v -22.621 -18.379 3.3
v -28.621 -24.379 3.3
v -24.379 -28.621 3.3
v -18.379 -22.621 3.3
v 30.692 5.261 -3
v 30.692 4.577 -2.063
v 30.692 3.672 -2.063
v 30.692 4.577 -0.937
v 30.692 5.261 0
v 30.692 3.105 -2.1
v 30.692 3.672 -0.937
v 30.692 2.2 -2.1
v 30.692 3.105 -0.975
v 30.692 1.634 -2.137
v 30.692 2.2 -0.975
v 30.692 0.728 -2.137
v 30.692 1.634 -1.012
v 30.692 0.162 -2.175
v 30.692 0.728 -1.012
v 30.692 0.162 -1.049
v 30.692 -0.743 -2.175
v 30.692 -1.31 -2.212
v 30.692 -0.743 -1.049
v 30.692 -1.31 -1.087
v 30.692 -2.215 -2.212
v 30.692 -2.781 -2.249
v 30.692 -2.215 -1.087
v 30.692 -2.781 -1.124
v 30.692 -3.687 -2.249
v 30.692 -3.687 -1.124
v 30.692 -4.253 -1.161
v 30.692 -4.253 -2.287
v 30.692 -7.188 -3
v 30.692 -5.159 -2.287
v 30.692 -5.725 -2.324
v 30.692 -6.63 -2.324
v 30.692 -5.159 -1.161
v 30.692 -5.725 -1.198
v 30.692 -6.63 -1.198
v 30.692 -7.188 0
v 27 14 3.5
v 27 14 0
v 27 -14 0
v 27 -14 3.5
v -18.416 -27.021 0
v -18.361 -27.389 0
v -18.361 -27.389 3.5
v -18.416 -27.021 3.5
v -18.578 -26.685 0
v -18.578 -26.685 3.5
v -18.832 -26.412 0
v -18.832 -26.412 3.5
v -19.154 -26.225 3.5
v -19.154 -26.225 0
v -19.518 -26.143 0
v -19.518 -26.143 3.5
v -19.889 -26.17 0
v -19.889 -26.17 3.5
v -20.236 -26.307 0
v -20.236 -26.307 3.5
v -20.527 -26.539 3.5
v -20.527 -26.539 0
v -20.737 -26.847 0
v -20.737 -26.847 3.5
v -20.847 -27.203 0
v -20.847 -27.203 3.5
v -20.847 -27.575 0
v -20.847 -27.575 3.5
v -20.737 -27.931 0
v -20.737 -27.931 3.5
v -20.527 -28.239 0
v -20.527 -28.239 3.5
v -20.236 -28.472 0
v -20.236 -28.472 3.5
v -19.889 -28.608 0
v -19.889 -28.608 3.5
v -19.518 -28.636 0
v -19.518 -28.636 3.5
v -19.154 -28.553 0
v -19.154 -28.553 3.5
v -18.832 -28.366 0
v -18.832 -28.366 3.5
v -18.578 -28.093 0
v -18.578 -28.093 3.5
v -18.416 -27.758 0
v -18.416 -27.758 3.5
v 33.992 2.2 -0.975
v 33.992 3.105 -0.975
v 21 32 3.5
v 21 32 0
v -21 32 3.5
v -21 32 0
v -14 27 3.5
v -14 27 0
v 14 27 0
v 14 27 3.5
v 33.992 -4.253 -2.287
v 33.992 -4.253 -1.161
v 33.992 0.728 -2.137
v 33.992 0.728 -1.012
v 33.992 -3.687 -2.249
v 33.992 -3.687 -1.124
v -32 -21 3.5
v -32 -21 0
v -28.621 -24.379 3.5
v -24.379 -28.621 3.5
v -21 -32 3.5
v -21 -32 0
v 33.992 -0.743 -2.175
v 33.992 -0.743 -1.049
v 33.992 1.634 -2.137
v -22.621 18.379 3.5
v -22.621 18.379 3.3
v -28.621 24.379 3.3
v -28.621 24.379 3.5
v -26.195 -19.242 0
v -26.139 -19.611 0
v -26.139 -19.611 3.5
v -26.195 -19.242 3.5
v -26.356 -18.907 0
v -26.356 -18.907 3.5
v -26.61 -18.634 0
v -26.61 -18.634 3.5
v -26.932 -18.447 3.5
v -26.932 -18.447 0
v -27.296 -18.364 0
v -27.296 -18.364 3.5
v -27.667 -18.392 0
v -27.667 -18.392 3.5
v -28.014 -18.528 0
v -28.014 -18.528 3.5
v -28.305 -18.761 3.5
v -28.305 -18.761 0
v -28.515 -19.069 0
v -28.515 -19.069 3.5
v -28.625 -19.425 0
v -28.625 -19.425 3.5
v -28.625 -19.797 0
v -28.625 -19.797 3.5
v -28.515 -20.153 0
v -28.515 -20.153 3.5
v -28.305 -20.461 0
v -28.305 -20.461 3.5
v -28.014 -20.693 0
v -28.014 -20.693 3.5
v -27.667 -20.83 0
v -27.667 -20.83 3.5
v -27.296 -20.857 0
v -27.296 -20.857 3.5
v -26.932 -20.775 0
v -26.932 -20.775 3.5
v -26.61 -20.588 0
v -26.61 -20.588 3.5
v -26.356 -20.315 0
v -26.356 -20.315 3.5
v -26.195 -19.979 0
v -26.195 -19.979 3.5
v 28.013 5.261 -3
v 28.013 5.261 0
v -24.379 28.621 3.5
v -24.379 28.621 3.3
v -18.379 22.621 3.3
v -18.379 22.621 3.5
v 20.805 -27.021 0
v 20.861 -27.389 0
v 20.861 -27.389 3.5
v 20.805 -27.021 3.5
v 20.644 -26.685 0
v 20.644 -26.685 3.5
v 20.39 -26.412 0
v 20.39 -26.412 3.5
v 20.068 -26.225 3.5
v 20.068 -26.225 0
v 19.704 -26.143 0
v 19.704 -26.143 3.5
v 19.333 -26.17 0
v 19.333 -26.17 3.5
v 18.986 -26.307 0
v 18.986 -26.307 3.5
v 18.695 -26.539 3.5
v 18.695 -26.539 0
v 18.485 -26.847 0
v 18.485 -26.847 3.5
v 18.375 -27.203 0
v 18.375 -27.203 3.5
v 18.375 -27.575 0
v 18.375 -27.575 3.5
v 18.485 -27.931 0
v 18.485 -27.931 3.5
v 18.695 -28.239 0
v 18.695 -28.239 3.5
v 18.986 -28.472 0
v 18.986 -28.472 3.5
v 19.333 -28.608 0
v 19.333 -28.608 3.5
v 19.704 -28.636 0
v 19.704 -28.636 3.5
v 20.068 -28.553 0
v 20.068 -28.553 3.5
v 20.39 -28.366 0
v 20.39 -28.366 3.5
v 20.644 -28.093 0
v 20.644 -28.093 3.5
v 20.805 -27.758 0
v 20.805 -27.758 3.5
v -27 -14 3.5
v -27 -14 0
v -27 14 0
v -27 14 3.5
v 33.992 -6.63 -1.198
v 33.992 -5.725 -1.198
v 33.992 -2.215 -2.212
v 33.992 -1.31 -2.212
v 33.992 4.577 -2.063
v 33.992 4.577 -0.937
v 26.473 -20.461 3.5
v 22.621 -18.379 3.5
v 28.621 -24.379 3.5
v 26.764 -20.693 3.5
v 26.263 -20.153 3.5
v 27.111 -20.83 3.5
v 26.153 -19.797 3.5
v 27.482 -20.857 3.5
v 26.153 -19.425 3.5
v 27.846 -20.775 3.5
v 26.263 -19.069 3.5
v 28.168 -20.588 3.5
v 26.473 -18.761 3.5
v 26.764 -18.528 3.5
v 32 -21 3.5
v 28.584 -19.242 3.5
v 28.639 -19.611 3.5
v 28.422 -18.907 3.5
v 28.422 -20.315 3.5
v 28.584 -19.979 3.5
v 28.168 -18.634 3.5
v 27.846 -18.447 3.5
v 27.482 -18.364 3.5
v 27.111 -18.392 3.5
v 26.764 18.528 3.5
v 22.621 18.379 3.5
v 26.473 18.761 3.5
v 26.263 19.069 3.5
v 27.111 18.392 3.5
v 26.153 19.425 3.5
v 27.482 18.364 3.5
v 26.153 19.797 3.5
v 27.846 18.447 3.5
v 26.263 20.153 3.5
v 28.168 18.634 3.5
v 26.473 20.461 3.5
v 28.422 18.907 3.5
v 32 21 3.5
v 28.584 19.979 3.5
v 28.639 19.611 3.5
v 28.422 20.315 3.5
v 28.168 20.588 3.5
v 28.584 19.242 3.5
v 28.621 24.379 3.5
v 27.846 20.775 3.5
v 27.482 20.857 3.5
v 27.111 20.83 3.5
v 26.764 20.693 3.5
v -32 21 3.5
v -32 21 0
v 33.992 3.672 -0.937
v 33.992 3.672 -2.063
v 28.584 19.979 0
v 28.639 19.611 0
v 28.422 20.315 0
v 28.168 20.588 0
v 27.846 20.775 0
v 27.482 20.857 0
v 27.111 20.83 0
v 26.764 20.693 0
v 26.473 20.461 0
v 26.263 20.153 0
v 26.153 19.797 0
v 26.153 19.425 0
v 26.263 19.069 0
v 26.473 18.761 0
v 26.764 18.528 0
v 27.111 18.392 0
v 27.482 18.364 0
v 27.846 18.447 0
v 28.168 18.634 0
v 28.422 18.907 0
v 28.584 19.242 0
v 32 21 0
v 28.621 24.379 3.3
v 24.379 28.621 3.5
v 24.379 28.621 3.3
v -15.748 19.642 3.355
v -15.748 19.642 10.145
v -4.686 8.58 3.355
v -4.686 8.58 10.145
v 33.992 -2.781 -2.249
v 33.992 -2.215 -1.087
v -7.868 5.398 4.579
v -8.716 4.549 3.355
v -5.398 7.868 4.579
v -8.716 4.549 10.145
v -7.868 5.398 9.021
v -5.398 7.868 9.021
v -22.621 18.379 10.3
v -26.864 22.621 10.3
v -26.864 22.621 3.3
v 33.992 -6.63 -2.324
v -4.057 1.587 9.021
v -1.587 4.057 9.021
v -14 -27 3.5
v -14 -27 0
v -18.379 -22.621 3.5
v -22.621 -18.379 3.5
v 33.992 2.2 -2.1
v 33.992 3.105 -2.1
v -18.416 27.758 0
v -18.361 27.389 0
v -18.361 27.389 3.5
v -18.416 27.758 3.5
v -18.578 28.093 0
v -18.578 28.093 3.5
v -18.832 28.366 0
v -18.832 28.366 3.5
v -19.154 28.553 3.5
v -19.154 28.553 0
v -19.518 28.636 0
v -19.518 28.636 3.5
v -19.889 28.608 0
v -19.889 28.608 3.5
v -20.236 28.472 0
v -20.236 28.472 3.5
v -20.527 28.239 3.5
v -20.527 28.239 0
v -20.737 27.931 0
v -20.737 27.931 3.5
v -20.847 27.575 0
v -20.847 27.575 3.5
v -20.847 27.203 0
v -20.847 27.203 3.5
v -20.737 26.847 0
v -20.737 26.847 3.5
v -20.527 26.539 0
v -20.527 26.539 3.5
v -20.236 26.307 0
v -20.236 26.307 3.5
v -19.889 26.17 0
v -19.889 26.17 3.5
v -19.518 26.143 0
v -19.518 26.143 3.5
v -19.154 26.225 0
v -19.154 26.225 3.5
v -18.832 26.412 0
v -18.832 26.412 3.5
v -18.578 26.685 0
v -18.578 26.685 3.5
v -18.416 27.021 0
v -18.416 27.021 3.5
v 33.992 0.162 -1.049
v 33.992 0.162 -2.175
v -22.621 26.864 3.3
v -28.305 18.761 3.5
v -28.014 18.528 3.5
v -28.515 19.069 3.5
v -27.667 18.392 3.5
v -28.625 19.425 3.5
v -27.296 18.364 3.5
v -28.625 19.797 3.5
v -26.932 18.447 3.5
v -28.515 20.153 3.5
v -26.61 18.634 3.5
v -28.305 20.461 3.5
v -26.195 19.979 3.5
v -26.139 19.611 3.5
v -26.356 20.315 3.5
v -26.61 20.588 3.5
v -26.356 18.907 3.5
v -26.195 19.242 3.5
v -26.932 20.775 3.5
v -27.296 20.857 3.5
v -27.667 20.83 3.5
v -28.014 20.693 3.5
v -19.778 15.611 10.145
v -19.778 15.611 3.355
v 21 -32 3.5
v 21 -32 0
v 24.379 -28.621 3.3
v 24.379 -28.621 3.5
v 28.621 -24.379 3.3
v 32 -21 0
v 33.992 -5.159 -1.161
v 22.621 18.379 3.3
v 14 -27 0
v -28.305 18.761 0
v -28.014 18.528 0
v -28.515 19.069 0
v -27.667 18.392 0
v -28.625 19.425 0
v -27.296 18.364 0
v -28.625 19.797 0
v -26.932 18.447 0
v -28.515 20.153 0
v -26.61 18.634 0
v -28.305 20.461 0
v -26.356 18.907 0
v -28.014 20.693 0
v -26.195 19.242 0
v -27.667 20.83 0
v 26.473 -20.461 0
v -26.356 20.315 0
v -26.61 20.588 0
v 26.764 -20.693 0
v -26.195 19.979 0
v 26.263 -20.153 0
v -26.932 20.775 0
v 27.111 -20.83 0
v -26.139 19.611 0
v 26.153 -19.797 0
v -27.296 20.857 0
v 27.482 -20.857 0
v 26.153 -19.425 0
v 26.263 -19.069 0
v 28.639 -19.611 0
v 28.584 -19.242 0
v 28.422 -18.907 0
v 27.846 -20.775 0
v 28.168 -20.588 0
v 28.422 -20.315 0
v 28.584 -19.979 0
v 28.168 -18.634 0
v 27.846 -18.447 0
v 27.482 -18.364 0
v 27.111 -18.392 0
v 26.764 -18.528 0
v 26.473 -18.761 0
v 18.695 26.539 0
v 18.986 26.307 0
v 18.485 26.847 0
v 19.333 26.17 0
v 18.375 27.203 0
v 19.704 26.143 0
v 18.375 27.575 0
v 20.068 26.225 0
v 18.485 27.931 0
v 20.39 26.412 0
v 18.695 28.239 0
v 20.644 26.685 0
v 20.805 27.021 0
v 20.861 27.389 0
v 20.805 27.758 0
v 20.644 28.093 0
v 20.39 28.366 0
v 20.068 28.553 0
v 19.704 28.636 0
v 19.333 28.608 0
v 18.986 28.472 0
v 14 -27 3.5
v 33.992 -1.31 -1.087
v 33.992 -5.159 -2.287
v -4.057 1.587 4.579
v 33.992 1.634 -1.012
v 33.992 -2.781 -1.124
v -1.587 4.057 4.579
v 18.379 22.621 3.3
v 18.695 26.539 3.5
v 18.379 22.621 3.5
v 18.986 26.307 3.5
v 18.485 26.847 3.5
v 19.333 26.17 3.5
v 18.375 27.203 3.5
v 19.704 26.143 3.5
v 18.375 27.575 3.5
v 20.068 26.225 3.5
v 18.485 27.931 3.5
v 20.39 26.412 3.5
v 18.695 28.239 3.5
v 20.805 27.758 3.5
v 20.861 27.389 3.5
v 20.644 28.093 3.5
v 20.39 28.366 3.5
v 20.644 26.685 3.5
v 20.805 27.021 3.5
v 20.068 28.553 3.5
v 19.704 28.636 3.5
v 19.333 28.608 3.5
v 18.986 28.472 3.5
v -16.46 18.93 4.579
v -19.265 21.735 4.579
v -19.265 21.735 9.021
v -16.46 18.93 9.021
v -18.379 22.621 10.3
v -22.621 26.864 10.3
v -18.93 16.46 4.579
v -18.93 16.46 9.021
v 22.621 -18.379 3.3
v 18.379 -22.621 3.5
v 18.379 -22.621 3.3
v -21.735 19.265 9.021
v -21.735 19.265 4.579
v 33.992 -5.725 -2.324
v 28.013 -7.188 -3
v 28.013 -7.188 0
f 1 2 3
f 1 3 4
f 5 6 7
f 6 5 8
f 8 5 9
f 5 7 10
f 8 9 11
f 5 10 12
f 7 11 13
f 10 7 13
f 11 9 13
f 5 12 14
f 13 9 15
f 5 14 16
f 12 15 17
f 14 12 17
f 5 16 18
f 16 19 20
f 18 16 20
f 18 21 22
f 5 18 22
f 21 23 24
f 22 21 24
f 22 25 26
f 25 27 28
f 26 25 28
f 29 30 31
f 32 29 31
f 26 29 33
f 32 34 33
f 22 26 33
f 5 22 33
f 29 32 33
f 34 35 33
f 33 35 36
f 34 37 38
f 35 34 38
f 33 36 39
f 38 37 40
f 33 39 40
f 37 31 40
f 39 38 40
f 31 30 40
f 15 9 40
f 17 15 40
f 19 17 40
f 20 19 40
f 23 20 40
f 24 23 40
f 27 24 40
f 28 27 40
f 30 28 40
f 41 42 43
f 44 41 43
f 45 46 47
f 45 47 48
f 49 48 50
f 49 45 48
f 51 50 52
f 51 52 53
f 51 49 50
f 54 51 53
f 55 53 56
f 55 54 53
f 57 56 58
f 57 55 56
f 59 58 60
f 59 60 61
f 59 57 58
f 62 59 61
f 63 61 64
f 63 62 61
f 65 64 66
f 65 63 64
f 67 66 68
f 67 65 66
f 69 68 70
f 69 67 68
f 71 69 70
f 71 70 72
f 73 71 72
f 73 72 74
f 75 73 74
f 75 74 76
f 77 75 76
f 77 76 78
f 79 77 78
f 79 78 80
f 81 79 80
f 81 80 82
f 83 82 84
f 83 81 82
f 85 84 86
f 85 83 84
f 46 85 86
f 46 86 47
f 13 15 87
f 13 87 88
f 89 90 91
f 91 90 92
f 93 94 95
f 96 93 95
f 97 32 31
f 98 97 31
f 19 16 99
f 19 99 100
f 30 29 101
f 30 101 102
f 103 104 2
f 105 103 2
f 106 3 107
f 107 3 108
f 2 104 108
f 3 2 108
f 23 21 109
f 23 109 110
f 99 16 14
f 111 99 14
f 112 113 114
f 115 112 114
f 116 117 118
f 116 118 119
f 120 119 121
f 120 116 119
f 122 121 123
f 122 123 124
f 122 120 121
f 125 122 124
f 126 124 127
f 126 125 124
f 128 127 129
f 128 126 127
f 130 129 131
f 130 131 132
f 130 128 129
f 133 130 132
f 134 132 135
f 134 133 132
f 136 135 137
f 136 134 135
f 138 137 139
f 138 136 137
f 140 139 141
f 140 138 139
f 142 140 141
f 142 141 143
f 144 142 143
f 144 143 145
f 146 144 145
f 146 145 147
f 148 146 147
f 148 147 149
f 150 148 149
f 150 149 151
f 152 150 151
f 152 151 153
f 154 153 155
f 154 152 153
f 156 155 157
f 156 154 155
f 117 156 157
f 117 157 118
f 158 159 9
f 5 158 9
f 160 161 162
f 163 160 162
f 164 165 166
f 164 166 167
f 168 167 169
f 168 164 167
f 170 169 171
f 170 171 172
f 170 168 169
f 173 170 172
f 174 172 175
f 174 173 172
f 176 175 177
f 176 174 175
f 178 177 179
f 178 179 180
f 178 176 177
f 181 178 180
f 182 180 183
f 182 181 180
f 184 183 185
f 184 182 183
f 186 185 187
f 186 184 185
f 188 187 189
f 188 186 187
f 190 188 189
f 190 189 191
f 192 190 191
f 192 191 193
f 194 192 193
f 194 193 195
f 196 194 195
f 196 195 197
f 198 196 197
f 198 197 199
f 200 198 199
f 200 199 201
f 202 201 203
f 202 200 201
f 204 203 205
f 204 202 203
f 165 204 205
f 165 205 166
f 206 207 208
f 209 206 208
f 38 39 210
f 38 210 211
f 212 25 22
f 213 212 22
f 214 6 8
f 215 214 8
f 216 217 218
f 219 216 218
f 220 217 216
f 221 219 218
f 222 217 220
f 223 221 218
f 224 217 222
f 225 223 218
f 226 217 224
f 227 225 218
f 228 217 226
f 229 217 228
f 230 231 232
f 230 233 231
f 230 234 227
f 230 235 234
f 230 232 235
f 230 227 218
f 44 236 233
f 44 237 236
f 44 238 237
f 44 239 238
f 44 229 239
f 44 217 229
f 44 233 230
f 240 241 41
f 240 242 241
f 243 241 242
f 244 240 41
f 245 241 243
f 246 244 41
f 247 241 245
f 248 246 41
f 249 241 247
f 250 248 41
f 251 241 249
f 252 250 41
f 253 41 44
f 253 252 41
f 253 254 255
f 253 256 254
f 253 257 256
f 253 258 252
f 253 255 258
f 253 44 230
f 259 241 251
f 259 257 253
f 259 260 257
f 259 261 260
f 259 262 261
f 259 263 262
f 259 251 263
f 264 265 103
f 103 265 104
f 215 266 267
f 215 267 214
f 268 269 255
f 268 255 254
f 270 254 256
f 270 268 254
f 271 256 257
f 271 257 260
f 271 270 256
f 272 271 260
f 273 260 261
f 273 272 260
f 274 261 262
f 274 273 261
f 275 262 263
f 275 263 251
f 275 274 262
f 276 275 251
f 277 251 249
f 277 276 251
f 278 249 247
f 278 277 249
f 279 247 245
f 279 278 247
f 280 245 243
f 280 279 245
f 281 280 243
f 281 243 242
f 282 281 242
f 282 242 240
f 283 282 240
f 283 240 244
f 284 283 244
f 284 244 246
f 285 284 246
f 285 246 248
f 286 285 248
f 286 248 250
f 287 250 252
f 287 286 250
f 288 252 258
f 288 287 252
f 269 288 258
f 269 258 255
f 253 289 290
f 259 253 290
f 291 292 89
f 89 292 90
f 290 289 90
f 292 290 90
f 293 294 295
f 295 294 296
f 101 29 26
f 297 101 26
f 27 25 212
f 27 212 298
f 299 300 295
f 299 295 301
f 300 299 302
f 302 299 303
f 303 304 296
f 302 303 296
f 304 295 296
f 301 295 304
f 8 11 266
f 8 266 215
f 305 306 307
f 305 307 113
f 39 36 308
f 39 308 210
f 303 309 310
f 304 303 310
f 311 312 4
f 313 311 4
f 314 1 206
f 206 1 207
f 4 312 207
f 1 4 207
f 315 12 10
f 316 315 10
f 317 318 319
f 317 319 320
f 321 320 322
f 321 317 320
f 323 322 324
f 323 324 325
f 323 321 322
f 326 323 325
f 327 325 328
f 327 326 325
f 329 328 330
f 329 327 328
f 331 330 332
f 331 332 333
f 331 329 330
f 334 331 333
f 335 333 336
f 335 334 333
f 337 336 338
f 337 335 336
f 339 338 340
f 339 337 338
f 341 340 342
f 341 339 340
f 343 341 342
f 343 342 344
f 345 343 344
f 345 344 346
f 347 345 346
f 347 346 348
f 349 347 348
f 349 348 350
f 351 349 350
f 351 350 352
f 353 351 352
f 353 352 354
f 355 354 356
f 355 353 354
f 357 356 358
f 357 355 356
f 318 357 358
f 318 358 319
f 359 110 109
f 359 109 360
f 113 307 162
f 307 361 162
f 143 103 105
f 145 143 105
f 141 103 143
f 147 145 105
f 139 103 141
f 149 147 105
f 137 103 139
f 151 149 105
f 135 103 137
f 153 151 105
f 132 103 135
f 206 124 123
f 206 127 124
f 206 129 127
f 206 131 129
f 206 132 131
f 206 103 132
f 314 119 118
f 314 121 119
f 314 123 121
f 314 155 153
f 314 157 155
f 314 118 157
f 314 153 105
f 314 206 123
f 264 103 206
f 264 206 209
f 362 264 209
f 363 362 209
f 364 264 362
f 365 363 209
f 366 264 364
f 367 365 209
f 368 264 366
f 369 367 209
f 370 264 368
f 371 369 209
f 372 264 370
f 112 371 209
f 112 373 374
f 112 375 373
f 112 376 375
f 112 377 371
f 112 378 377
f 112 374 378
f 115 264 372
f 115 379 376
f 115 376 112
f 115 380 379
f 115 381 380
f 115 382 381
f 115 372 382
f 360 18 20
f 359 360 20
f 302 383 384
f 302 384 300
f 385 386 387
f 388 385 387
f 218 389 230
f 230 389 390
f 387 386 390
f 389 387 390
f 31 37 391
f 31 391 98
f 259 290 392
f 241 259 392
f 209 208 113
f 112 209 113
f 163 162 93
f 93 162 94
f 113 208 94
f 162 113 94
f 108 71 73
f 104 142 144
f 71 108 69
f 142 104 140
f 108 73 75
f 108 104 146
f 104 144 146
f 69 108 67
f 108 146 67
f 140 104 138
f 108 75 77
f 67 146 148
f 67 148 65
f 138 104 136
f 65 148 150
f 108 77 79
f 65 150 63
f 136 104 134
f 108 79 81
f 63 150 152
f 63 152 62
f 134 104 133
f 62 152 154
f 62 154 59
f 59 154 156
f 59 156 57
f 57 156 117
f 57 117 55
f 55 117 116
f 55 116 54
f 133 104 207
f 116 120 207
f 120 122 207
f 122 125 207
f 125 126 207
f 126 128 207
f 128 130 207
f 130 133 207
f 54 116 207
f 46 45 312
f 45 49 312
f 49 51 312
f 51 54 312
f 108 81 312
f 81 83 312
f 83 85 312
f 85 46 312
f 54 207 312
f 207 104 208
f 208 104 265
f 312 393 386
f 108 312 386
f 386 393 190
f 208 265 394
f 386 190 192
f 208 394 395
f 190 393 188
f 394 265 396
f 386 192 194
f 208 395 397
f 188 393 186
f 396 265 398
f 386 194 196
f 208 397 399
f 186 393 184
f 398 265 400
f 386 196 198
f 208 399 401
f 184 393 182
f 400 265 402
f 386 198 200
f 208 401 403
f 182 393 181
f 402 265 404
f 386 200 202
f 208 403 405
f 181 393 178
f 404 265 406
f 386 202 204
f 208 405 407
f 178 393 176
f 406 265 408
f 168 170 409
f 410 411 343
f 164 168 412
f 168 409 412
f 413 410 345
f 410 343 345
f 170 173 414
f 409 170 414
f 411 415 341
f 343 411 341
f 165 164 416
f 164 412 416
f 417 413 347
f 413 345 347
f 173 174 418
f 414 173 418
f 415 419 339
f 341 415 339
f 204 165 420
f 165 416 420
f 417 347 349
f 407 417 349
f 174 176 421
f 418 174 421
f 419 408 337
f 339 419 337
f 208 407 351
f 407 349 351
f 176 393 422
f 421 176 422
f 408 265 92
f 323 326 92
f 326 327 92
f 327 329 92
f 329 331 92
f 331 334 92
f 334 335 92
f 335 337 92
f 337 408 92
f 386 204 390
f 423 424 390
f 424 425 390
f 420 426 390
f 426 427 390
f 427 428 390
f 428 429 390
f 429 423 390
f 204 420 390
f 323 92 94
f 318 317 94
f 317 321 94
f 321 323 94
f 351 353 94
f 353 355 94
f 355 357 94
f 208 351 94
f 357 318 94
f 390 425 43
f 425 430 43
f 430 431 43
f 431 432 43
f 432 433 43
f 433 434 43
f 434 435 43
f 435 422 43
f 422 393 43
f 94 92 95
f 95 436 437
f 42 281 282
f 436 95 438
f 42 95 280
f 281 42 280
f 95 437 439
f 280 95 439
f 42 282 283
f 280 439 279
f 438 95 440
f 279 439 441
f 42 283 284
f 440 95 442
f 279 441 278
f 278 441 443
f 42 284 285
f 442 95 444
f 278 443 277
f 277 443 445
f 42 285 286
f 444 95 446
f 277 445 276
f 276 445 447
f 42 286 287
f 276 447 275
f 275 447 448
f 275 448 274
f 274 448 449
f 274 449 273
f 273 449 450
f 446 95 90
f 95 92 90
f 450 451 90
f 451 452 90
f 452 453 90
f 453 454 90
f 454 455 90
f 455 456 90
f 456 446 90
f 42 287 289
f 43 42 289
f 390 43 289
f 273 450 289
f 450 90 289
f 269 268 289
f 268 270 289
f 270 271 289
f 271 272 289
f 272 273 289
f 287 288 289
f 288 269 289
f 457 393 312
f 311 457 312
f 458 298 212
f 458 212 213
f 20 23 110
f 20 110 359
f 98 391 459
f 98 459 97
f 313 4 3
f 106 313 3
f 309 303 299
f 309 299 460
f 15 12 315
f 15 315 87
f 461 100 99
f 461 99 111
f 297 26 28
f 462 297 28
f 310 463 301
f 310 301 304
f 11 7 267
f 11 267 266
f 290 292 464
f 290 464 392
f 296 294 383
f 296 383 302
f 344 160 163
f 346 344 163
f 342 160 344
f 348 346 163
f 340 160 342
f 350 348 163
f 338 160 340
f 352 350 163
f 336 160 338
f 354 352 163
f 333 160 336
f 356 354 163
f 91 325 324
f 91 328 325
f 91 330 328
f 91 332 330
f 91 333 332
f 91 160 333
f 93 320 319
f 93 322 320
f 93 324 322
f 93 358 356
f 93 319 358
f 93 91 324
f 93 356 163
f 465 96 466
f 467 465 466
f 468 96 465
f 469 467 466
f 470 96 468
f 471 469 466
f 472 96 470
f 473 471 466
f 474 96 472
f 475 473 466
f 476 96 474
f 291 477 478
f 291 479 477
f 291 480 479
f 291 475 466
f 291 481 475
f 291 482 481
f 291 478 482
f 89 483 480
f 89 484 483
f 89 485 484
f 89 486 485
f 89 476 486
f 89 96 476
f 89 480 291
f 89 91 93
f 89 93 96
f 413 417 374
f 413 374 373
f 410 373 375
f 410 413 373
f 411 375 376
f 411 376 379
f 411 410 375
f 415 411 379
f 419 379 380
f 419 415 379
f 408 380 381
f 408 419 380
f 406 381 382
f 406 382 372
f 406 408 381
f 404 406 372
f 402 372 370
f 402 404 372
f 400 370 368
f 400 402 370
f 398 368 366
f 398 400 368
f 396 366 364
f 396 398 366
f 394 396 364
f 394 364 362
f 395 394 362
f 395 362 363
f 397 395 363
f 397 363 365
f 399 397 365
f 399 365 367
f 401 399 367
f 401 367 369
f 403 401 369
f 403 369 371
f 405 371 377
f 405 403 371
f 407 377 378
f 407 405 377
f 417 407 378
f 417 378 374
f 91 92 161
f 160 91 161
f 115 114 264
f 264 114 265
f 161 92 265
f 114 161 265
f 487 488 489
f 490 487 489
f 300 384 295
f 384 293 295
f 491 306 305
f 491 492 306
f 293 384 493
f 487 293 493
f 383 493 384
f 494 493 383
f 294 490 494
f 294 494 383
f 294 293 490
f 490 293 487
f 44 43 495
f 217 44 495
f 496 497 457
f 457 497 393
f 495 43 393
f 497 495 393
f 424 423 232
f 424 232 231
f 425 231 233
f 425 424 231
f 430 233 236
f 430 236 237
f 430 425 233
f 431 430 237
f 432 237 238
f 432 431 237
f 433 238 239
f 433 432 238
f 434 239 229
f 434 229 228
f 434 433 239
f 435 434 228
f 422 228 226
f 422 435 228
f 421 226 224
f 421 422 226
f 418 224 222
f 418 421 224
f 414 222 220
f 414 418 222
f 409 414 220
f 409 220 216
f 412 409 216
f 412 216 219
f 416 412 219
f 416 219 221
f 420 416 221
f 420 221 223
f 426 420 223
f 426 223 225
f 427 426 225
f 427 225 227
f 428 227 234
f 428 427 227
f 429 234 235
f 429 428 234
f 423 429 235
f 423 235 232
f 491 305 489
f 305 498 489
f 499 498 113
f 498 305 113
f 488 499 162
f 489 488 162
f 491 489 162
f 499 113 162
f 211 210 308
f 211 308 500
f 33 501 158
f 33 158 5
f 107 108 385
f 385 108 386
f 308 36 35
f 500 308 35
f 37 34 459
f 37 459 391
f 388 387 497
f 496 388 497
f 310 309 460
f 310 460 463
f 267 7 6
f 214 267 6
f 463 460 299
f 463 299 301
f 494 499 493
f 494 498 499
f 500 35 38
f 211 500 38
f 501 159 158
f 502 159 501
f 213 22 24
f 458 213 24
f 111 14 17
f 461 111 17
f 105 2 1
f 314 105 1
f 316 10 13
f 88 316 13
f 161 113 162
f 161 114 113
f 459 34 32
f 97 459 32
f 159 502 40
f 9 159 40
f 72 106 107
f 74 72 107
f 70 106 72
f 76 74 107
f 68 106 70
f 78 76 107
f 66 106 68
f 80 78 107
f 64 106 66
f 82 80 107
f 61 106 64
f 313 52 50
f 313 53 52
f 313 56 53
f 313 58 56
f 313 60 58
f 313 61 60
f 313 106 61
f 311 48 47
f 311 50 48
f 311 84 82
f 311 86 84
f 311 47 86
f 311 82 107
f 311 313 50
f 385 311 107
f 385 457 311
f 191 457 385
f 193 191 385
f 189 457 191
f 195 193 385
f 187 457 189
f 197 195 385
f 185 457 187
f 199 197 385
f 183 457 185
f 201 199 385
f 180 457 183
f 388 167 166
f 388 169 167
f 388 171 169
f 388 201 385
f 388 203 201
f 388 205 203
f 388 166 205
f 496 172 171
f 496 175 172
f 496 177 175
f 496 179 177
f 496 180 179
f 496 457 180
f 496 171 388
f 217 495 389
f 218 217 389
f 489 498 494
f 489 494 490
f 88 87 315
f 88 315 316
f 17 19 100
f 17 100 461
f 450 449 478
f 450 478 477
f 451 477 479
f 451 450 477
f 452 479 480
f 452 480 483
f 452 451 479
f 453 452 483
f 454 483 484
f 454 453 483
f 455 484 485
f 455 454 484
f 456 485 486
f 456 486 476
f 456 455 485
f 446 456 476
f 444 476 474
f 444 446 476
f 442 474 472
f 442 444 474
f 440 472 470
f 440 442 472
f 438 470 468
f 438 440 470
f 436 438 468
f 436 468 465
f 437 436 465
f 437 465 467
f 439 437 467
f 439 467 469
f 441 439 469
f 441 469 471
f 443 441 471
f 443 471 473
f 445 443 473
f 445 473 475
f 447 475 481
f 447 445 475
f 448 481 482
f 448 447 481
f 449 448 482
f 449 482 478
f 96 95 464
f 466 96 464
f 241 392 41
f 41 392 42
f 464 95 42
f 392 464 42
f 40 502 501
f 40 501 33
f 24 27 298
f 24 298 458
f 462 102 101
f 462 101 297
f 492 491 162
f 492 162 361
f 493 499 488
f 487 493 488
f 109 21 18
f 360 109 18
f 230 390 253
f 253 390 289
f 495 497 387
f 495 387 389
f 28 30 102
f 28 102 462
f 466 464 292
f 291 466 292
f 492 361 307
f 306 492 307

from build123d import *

# Parameters (mm, degrees)
F1_DEPTH       = 3.3
F0_R           = 1.25
F2_DEPTH       = 3.5
F5_DEPTH       = 7
F6_W           = 3.4931492992
F6_H           = 4.4417206138
F7_DEPTH       = 25
F10_W          = 15.6438741833
F10_H          = 6.7903799936
F11_DEPTH      = 4.5
F11_DEPTH_BACK = 1.2
F12_W          = 2.6789866388
F12_H          = 12.4484598637
F13_DEPTH      = 3
F14_W          = 0.9054932743
F14_H          = 1.1253841482
F15_DEPTH      = 3.3


with BuildPart() as f1:
    # F0 (on Top) → F1 (new body)
    with BuildSketch(Plane.XY):
        Polygon((-22.6213203436, 18.3786796564), (-18.3786796564, 22.6213203436), (-24.3786796564, 28.6213203436), (-28.6213203436, 24.3786796564), align=None)
    extrude(amount=F1_DEPTH)


with BuildPart() as f1b:
    # F0 (on Top) → F1, piece 2 (new body)
    with BuildSketch(Plane.XY):
        Polygon((24.3786796564, 28.6213203436), (18.3786796564, 22.6213203436), (22.6213203436, 18.3786796564), (28.6213203436, 24.3786796564), align=None)
    extrude(amount=F1_DEPTH)


with BuildPart() as f1c:
    # F0 (on Top) → F1, piece 3 (new body)
    with BuildSketch(Plane.XY):
        Polygon((28.6213203436, -24.3786796564), (22.6213203436, -18.3786796564), (18.3786796564, -22.6213203436), (24.3786796564, -28.6213203436), align=None)
    extrude(amount=F1_DEPTH)


with BuildPart() as f1d:
    # F0 (on Top) → F1, piece 4 (new body)
    with BuildSketch(Plane.XY):
        Polygon((-18.3786796564, -22.6213203436), (-22.6213203436, -18.3786796564), (-28.6213203436, -24.3786796564), (-24.3786796564, -28.6213203436), align=None)
    extrude(amount=F1_DEPTH)


with BuildPart() as f2:
    # F0 (on Top) → F2 (new body)
    with BuildSketch(Plane.XY):
        Polygon((-27, 14), (-22.6213203436, 18.3786796564), (-28.6213203436, 24.3786796564), (-32, 21), (-32, -21), (-28.6213203436, -24.3786796564), (-22.6213203436, -18.3786796564), (-27, -14), align=None)
        with Locations((-27.3890872966, -19.6109127034)):
            Circle(F0_R, mode=Mode.SUBTRACT)
        with Locations((-27.3890872965, 19.6109127035)):
            Circle(F0_R, mode=Mode.SUBTRACT)
    extrude(amount=F2_DEPTH)


with BuildPart() as f2b:
    # F0 (on Top) → F2, piece 2 (new body)
    with BuildSketch(Plane.XY):
        Polygon((-18.3786796564, 22.6213203436), (-14, 27), (14, 27), (18.3786796564, 22.6213203436), (24.3786796564, 28.6213203436), (21, 32), (-21, 32), (-24.3786796564, 28.6213203436), align=None)
        with Locations((-19.6109127034, 27.3890872966)):
            Circle(F0_R, mode=Mode.SUBTRACT)
        with Locations((19.6109127035, 27.3890872965)):
            Circle(F0_R, mode=Mode.SUBTRACT)
    extrude(amount=F2_DEPTH)


with BuildPart() as f2c:
    # F0 (on Top) → F2, piece 3 (new body)
    with BuildSketch(Plane.XY):
        Polygon((28.6213203436, 24.3786796564), (22.6213203436, 18.3786796564), (27, 14), (27, -14), (22.6213203436, -18.3786796564), (28.6213203436, -24.3786796564), (32, -21), (32, 21), align=None)
        with Locations((27.3890872965, -19.6109127035)):
            Circle(F0_R, mode=Mode.SUBTRACT)
        with Locations((27.3890872966, 19.6109127034)):
            Circle(F0_R, mode=Mode.SUBTRACT)
    extrude(amount=F2_DEPTH)


with BuildPart() as f2d:
    # F0 (on Top) → F2, piece 4 (new body)
    with BuildSketch(Plane.XY):
        Polygon((-14, -27), (-18.3786796564, -22.6213203436), (-24.3786796564, -28.6213203436), (-21, -32), (21, -32), (24.3786796564, -28.6213203436), (18.3786796564, -22.6213203436), (14, -27), align=None)
        with Locations((-19.6109127035, -27.3890872965)):
            Circle(F0_R, mode=Mode.SUBTRACT)
        with Locations((19.6109127034, -27.3890872966)):
            Circle(F0_R, mode=Mode.SUBTRACT)
    extrude(amount=F2_DEPTH)


with BuildPart() as f2_1:
    add(f2.part)

    # F3: union F1d, F2d, F1c, F2c, F1b, F2b, F1
    add(f1d.part)
    add(f2d.part)
    add(f1c.part)
    add(f2c.part)
    add(f1b.part)
    add(f2b.part)
    add(f1.part)


with BuildPart() as f5:
    # F4 (on face) → F5 (new body)
    with BuildSketch(Plane.XY.offset(3.3)):
        Polygon((-26.8639610307, 22.6213203436), (-22.6213203436, 18.3786796564), (-18.3786796564, 22.6213203436), (-22.6213203436, 26.8639610307), align=None)
    extrude(amount=F5_DEPTH)

    # F6 (on face) → F7 (join)
    with BuildSketch(Plane(origin=(-20.5, 20.5, 0), x_dir=(0.7071067812, 0.7071067812, 0), z_dir=(0.7071067812, -0.7071067812, 0))):
        with Locations((0, 6.8)):
            Rectangle(F6_W, F6_H)
    extrude(amount=F7_DEPTH)


with BuildPart() as f8_1:
    # F8: copy of F5
    add(f5.part)

    # F10 (on face) → F11 (join, two sides)
    with BuildSketch(Plane(origin=(-1.2350147786, -1.2350147786, 0), x_dir=(0.7071067812, -0.7071067812, 0), z_dir=(-0.7071067812, -0.7071067812, 0))) as f11_sk:
        with Locations((-17.2023242339, 6.7497757263)):
            Rectangle(F10_W, F10_H)
    extrude(amount=-F11_DEPTH)
    extrude(f11_sk.sketch, amount=F11_DEPTH_BACK)


with BuildPart() as f13:
    # F12 (on face) → F13 (new body)
    with BuildSketch(Plane(origin=(0, 0, 0), x_dir=(1, 0, 0), z_dir=(0, 0, -1))):
        with Locations((29.3528102338, 0.96334517)):
            Rectangle(F12_W, F12_H)
    extrude(amount=F13_DEPTH)

    # F14 (on face) → F15 (join)
    with BuildSketch(Plane.YZ.offset(30.6923035532)):
        with Locations((-6.1774876997, -1.7611554813)):
            Rectangle(F14_W, F14_H)
        with Locations((-4.7057819769, -1.7238475554)):
            Rectangle(F14_W, F14_H)
        with Locations((-3.2340762541, -1.6865396295)):
            Rectangle(F14_W, F14_H)
        with Locations((4.12445236, -1.5)):
            Rectangle(F14_W, F14_H)
        with Locations((2.6527466372, -1.5373079259)):
            Rectangle(F14_W, F14_H)
        with Locations((1.1810409144, -1.5746158518)):
            Rectangle(F14_W, F14_H)
        with Locations((-0.2906648085, -1.6119237777)):
            Rectangle(F14_W, F14_H)
        with Locations((-1.7623705313, -1.6492317036)):
            Rectangle(F14_W, F14_H)
    extrude(amount=F15_DEPTH)


solid = Compound([f2_1.part, f8_1.part, f13.part])
